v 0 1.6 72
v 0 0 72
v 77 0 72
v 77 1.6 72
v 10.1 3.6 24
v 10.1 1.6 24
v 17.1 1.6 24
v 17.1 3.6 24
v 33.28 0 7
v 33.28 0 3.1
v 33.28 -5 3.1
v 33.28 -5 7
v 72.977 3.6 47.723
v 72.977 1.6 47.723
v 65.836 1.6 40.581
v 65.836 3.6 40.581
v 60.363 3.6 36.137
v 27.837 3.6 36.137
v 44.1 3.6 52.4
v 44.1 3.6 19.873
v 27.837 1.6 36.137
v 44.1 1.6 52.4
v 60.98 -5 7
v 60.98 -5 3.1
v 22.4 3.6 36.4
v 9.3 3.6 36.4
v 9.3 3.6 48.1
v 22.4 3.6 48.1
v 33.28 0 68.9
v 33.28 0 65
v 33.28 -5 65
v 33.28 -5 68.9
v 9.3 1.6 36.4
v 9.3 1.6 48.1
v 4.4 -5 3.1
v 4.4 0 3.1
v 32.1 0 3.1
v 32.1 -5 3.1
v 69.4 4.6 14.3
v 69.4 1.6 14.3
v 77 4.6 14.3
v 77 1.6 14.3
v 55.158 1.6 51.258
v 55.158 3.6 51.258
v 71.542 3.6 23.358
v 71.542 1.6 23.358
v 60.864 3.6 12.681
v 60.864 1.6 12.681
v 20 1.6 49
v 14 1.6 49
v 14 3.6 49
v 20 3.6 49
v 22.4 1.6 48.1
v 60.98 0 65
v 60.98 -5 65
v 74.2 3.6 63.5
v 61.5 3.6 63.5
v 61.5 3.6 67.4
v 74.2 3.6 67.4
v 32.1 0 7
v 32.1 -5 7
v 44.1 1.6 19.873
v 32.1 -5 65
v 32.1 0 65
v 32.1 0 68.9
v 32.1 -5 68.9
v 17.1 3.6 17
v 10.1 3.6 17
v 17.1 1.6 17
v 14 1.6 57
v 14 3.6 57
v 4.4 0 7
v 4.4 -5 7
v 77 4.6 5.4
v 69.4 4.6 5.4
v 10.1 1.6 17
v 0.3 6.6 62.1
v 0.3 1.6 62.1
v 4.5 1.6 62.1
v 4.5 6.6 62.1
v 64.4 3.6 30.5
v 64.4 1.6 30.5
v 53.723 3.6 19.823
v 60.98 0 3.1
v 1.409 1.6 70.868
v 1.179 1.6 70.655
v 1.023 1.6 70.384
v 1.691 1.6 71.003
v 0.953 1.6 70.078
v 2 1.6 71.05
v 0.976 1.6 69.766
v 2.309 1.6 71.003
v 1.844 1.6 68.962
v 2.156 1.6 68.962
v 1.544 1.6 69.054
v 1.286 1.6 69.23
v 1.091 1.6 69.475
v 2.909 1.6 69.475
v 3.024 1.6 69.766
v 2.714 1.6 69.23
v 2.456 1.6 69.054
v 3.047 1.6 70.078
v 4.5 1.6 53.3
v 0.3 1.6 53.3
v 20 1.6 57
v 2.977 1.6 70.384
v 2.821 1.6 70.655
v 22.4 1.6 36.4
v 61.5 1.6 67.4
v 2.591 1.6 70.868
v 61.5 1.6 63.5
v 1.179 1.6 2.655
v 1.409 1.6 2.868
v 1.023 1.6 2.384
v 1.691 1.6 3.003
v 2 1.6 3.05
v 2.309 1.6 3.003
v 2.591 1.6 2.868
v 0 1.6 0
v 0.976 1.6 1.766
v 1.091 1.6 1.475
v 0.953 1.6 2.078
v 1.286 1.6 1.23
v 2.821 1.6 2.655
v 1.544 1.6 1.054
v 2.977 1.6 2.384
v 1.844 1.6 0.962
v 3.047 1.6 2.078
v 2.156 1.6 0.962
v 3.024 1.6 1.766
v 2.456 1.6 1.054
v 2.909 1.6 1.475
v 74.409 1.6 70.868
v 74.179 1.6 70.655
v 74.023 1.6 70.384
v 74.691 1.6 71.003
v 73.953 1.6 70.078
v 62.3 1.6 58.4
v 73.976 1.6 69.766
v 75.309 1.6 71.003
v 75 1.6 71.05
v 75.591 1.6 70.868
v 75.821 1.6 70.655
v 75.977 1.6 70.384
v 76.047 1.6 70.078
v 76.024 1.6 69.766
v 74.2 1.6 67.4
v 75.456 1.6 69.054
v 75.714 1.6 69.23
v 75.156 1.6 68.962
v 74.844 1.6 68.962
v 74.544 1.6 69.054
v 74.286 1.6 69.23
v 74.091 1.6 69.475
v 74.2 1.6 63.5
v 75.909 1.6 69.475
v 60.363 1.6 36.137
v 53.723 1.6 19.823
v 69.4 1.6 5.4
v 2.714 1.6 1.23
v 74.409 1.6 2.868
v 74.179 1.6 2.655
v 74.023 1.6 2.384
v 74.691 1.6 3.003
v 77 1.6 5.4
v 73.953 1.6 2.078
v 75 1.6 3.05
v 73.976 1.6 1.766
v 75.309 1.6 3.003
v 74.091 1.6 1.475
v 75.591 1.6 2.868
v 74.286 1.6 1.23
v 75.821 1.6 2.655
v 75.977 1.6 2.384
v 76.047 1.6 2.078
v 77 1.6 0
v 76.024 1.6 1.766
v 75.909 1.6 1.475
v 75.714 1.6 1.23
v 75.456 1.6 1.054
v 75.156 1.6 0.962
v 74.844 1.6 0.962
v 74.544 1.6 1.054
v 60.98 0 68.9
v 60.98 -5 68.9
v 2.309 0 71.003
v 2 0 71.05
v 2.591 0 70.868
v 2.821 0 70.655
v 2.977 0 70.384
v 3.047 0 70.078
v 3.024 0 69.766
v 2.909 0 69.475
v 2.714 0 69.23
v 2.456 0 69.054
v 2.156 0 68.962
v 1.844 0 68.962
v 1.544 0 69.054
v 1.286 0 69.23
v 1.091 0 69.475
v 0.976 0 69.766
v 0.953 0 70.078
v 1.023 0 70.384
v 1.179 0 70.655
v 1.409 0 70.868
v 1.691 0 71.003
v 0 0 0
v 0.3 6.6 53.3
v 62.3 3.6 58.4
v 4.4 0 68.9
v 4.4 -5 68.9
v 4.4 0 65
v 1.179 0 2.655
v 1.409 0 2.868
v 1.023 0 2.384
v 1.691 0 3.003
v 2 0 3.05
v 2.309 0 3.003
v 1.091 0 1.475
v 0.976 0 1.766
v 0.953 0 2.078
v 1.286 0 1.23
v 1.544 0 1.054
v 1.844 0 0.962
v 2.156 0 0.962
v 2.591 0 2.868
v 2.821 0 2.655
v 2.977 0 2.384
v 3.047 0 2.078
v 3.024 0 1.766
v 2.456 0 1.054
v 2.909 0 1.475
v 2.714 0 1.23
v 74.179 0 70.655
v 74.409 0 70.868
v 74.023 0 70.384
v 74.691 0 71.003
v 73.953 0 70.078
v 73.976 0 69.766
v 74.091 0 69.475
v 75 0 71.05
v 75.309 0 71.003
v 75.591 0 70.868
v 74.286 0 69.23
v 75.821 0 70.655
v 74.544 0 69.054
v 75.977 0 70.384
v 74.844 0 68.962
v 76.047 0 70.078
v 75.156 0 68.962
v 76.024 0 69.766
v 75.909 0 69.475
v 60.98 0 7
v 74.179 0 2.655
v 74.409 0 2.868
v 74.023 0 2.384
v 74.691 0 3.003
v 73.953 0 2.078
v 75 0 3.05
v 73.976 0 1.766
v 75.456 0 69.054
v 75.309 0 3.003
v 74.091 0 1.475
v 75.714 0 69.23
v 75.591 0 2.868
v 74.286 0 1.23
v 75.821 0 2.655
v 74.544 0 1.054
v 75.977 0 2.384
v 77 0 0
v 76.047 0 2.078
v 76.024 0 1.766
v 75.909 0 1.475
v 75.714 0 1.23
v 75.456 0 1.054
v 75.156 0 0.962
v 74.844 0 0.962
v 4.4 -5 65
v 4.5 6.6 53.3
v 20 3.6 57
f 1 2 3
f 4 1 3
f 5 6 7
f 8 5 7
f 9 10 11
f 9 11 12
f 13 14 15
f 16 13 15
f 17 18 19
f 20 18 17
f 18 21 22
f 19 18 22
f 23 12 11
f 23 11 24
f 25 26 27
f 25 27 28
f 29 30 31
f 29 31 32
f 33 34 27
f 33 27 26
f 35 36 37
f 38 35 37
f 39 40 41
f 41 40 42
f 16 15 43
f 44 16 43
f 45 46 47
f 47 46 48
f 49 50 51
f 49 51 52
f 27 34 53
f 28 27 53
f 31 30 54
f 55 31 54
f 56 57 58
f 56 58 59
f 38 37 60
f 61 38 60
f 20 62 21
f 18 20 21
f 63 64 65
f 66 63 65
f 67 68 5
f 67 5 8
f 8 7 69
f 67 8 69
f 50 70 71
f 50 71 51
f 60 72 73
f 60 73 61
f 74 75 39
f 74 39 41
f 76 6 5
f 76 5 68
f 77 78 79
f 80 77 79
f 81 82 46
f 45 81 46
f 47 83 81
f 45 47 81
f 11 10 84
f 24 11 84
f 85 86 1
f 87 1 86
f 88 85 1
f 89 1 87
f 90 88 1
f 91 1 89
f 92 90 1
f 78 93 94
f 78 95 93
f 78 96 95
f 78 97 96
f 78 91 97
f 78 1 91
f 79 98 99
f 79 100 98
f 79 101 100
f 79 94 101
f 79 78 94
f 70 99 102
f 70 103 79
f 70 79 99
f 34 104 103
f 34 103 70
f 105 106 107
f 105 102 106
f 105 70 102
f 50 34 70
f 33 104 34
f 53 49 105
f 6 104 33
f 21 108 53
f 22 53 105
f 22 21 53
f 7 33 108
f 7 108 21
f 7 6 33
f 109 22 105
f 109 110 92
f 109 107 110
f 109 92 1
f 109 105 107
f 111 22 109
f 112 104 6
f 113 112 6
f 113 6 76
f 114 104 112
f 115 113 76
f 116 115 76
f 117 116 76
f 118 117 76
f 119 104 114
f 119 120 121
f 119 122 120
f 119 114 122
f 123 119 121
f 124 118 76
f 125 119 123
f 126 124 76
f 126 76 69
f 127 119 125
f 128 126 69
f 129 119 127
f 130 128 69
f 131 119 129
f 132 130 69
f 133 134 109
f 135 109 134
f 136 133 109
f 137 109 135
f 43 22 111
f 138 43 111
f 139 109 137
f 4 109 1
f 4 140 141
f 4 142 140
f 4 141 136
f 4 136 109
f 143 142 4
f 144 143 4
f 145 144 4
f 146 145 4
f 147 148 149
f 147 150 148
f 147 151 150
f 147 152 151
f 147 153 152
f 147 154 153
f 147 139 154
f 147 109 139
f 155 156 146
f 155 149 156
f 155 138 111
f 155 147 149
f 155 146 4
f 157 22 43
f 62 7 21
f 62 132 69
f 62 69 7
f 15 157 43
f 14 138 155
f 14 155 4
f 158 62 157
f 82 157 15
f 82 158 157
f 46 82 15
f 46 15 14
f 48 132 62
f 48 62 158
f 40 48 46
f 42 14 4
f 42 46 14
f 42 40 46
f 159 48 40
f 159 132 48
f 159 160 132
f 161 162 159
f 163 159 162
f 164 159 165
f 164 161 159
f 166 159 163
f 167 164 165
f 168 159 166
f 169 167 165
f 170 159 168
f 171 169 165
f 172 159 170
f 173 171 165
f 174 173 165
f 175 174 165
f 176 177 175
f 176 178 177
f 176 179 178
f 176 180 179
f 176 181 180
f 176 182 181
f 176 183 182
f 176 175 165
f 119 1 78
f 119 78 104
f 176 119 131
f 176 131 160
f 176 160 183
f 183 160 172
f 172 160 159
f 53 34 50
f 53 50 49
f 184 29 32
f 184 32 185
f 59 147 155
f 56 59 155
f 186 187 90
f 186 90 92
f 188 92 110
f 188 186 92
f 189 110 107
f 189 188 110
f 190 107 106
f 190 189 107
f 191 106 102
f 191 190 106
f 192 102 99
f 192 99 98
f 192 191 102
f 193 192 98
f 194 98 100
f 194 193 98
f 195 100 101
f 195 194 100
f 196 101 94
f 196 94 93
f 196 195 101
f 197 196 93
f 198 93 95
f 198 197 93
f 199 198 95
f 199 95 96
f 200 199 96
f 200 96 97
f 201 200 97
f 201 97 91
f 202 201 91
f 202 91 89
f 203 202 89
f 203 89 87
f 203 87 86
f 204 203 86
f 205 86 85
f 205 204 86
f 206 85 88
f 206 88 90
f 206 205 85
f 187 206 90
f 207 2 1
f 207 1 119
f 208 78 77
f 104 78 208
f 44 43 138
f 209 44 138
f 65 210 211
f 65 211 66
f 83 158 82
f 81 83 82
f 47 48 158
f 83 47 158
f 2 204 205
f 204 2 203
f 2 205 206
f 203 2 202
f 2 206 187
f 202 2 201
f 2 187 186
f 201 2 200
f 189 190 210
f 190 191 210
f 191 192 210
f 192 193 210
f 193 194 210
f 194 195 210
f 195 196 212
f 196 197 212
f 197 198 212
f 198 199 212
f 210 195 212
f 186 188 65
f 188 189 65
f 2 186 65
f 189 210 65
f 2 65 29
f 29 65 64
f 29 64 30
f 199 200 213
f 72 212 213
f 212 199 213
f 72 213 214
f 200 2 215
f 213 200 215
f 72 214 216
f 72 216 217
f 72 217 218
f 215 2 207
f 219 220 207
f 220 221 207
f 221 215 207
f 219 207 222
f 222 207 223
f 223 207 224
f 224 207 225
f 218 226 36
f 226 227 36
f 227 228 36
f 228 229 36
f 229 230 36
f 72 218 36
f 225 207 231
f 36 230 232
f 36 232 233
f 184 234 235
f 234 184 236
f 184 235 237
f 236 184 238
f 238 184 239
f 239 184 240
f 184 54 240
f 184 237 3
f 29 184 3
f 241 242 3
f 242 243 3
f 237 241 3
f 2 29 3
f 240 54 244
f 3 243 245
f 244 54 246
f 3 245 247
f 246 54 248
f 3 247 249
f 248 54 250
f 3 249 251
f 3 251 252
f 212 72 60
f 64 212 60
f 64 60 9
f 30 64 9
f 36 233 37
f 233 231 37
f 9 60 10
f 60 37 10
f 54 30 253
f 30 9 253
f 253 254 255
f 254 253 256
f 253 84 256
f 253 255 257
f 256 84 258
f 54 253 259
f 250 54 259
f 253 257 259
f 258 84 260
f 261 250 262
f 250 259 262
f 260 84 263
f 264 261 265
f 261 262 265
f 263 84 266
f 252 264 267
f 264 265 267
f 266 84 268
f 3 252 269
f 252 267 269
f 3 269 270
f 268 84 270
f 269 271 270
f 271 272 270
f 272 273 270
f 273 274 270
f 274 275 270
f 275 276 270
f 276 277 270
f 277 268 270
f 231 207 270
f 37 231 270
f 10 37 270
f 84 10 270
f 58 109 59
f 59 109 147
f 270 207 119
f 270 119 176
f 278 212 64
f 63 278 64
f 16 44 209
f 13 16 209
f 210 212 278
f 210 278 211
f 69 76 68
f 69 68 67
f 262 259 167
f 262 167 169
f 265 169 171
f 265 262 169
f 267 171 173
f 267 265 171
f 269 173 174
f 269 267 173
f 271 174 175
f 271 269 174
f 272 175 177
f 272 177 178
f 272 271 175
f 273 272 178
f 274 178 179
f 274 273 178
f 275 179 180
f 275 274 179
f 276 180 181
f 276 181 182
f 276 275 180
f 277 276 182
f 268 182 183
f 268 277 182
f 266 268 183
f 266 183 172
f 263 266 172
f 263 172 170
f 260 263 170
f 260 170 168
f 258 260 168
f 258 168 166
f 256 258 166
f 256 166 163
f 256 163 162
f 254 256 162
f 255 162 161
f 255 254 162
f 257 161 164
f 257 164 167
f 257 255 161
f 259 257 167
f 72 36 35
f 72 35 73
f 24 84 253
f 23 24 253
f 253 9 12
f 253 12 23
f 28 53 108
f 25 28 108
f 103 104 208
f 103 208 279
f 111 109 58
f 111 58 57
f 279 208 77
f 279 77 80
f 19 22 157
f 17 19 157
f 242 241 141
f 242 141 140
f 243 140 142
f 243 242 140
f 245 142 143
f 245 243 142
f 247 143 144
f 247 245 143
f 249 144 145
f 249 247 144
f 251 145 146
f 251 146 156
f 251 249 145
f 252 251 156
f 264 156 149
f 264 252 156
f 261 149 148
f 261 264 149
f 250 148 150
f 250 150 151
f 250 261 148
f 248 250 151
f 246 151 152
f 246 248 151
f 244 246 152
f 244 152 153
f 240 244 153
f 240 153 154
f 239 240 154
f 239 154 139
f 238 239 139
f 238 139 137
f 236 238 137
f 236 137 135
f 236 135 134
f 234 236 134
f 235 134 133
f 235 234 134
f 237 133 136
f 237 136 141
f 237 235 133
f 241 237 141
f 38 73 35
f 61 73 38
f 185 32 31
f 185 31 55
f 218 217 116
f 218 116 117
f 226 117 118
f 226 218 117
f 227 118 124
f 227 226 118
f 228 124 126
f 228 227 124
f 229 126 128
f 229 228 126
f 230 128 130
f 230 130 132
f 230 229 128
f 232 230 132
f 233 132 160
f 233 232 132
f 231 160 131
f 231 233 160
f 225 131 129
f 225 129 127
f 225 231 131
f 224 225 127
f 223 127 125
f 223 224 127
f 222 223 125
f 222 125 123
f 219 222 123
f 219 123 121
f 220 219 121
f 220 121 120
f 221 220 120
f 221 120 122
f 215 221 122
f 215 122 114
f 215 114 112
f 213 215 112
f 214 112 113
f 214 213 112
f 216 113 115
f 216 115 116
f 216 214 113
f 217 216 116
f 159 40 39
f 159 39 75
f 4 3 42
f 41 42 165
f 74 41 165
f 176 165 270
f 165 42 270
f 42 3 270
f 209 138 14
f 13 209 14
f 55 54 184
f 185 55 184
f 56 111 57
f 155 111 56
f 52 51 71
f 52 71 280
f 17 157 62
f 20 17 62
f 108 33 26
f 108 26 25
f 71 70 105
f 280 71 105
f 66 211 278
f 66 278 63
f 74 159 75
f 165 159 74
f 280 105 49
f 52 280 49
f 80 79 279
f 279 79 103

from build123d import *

# Parameters (mm, degrees)
SKETCH_1_W      = 77
SKETCH_1_H      = 72
SKETCH_1_R      = 1.05
EXTRUDE_1_DEPTH = 1.6
SKETCH_2_W      = 7
SKETCH_2_H      = 7
SKETCH_2_W_2    = 13.1
SKETCH_2_H_2    = 11.7
SKETCH_2_W_3    = 6
SKETCH_2_H_3    = 8
SKETCH_2_W_4    = 12.7
SKETCH_2_H_4    = 3.9
EXTRUDE_2_DEPTH = 2
SKETCH_3_W      = 7.6
SKETCH_3_H      = 8.9
EXTRUDE_3_DEPTH = 3
SKETCH_5_W      = 4.2
SKETCH_5_H      = 8.8
EXTRUDE_4_DEPTH = 5
SKETCH_6_W      = 27.7
SKETCH_6_H      = 3.9
EXTRUDE_5_DEPTH = 5


with BuildPart() as part:
    # 草图1 → 凸台-拉伸1 (new body)
    with BuildSketch(Plane(origin=(0, 0, 0), x_dir=(1, 0, 0), z_dir=(0, 1, 0))):
        with Locations((38.5, -36)):
            Rectangle(SKETCH_1_W, SKETCH_1_H)
        with Locations(Location((2, -2, 0), (0, 0, 270))):
            Circle(SKETCH_1_R, mode=Mode.SUBTRACT)
        with Locations(Location((2, -70, 0), (0, 0, 270))):
            Circle(SKETCH_1_R, mode=Mode.SUBTRACT)
        with Locations(Location((75, -2, 0), (0, 0, 270))):
            Circle(SKETCH_1_R, mode=Mode.SUBTRACT)
        with Locations(Location((75, -70, 0), (0, 0, 270))):
            Circle(SKETCH_1_R, mode=Mode.SUBTRACT)
    extrude(amount=EXTRUDE_1_DEPTH)

    # 草图2 → 凸台-拉伸2 (add)
    with BuildSketch(Plane(origin=(0, 1.6, 0), x_dir=(1, 0, 0), z_dir=(0, 1, 0))):
        with Locations((13.6, -20.5)):
            Rectangle(SKETCH_2_W, SKETCH_2_H)
        Polygon((44.1, -19.873088065), (27.836544033, -36.136544033), (44.1, -52.4), (60.363455967, -36.136544033), align=None)
        with Locations((15.85, -42.25)):
            Rectangle(SKETCH_2_W_2, SKETCH_2_H_2)
        with Locations((17, -53)):
            Rectangle(SKETCH_2_W_3, SKETCH_2_H_3)
        Polygon((65.835533906, -40.580909114), (55.15822151, -51.25822151), (62.3, -58.4), (72.977312396, -47.722687604), align=None)
        Polygon((60.864466094, -12.680909114), (53.722687604, -19.822687604), (64.4, -30.5), (71.54177849, -23.35822151), align=None)
        with Locations((67.85, -65.45)):
            Rectangle(SKETCH_2_W_4, SKETCH_2_H_4)
    extrude(amount=EXTRUDE_2_DEPTH)

    # 草图3 → 凸台-拉伸3 (add)
    with BuildSketch(Plane(origin=(0, 1.6, 0), x_dir=(1, 0, 0), z_dir=(0, 1, 0))):
        with Locations((73.2, -9.85)):
            Rectangle(SKETCH_3_W, SKETCH_3_H)
    extrude(amount=EXTRUDE_3_DEPTH)

    # 草图5 → 凸台-拉伸4 (add)
    with BuildSketch(Plane(origin=(0, 1.6, 0), x_dir=(1, 0, 0), z_dir=(0, 1, 0))):
        with Locations((2.4, -57.7)):
            Rectangle(SKETCH_5_W, SKETCH_5_H)
    extrude(amount=EXTRUDE_4_DEPTH)

    # 草图6 → 凸台-拉伸5 (add)
    with BuildSketch(Plane.XZ):
        with Locations((18.25, 66.95)):
            Rectangle(SKETCH_6_W, SKETCH_6_H)
        with Locations((47.13, 66.95)):
            Rectangle(SKETCH_6_W, SKETCH_6_H)
        with Locations((18.25, 5.05)):
            Rectangle(SKETCH_6_W, SKETCH_6_H)
        with Locations((47.13, 5.05)):
            Rectangle(SKETCH_6_W, SKETCH_6_H)
    extrude(amount=EXTRUDE_5_DEPTH)


solid = part.part
